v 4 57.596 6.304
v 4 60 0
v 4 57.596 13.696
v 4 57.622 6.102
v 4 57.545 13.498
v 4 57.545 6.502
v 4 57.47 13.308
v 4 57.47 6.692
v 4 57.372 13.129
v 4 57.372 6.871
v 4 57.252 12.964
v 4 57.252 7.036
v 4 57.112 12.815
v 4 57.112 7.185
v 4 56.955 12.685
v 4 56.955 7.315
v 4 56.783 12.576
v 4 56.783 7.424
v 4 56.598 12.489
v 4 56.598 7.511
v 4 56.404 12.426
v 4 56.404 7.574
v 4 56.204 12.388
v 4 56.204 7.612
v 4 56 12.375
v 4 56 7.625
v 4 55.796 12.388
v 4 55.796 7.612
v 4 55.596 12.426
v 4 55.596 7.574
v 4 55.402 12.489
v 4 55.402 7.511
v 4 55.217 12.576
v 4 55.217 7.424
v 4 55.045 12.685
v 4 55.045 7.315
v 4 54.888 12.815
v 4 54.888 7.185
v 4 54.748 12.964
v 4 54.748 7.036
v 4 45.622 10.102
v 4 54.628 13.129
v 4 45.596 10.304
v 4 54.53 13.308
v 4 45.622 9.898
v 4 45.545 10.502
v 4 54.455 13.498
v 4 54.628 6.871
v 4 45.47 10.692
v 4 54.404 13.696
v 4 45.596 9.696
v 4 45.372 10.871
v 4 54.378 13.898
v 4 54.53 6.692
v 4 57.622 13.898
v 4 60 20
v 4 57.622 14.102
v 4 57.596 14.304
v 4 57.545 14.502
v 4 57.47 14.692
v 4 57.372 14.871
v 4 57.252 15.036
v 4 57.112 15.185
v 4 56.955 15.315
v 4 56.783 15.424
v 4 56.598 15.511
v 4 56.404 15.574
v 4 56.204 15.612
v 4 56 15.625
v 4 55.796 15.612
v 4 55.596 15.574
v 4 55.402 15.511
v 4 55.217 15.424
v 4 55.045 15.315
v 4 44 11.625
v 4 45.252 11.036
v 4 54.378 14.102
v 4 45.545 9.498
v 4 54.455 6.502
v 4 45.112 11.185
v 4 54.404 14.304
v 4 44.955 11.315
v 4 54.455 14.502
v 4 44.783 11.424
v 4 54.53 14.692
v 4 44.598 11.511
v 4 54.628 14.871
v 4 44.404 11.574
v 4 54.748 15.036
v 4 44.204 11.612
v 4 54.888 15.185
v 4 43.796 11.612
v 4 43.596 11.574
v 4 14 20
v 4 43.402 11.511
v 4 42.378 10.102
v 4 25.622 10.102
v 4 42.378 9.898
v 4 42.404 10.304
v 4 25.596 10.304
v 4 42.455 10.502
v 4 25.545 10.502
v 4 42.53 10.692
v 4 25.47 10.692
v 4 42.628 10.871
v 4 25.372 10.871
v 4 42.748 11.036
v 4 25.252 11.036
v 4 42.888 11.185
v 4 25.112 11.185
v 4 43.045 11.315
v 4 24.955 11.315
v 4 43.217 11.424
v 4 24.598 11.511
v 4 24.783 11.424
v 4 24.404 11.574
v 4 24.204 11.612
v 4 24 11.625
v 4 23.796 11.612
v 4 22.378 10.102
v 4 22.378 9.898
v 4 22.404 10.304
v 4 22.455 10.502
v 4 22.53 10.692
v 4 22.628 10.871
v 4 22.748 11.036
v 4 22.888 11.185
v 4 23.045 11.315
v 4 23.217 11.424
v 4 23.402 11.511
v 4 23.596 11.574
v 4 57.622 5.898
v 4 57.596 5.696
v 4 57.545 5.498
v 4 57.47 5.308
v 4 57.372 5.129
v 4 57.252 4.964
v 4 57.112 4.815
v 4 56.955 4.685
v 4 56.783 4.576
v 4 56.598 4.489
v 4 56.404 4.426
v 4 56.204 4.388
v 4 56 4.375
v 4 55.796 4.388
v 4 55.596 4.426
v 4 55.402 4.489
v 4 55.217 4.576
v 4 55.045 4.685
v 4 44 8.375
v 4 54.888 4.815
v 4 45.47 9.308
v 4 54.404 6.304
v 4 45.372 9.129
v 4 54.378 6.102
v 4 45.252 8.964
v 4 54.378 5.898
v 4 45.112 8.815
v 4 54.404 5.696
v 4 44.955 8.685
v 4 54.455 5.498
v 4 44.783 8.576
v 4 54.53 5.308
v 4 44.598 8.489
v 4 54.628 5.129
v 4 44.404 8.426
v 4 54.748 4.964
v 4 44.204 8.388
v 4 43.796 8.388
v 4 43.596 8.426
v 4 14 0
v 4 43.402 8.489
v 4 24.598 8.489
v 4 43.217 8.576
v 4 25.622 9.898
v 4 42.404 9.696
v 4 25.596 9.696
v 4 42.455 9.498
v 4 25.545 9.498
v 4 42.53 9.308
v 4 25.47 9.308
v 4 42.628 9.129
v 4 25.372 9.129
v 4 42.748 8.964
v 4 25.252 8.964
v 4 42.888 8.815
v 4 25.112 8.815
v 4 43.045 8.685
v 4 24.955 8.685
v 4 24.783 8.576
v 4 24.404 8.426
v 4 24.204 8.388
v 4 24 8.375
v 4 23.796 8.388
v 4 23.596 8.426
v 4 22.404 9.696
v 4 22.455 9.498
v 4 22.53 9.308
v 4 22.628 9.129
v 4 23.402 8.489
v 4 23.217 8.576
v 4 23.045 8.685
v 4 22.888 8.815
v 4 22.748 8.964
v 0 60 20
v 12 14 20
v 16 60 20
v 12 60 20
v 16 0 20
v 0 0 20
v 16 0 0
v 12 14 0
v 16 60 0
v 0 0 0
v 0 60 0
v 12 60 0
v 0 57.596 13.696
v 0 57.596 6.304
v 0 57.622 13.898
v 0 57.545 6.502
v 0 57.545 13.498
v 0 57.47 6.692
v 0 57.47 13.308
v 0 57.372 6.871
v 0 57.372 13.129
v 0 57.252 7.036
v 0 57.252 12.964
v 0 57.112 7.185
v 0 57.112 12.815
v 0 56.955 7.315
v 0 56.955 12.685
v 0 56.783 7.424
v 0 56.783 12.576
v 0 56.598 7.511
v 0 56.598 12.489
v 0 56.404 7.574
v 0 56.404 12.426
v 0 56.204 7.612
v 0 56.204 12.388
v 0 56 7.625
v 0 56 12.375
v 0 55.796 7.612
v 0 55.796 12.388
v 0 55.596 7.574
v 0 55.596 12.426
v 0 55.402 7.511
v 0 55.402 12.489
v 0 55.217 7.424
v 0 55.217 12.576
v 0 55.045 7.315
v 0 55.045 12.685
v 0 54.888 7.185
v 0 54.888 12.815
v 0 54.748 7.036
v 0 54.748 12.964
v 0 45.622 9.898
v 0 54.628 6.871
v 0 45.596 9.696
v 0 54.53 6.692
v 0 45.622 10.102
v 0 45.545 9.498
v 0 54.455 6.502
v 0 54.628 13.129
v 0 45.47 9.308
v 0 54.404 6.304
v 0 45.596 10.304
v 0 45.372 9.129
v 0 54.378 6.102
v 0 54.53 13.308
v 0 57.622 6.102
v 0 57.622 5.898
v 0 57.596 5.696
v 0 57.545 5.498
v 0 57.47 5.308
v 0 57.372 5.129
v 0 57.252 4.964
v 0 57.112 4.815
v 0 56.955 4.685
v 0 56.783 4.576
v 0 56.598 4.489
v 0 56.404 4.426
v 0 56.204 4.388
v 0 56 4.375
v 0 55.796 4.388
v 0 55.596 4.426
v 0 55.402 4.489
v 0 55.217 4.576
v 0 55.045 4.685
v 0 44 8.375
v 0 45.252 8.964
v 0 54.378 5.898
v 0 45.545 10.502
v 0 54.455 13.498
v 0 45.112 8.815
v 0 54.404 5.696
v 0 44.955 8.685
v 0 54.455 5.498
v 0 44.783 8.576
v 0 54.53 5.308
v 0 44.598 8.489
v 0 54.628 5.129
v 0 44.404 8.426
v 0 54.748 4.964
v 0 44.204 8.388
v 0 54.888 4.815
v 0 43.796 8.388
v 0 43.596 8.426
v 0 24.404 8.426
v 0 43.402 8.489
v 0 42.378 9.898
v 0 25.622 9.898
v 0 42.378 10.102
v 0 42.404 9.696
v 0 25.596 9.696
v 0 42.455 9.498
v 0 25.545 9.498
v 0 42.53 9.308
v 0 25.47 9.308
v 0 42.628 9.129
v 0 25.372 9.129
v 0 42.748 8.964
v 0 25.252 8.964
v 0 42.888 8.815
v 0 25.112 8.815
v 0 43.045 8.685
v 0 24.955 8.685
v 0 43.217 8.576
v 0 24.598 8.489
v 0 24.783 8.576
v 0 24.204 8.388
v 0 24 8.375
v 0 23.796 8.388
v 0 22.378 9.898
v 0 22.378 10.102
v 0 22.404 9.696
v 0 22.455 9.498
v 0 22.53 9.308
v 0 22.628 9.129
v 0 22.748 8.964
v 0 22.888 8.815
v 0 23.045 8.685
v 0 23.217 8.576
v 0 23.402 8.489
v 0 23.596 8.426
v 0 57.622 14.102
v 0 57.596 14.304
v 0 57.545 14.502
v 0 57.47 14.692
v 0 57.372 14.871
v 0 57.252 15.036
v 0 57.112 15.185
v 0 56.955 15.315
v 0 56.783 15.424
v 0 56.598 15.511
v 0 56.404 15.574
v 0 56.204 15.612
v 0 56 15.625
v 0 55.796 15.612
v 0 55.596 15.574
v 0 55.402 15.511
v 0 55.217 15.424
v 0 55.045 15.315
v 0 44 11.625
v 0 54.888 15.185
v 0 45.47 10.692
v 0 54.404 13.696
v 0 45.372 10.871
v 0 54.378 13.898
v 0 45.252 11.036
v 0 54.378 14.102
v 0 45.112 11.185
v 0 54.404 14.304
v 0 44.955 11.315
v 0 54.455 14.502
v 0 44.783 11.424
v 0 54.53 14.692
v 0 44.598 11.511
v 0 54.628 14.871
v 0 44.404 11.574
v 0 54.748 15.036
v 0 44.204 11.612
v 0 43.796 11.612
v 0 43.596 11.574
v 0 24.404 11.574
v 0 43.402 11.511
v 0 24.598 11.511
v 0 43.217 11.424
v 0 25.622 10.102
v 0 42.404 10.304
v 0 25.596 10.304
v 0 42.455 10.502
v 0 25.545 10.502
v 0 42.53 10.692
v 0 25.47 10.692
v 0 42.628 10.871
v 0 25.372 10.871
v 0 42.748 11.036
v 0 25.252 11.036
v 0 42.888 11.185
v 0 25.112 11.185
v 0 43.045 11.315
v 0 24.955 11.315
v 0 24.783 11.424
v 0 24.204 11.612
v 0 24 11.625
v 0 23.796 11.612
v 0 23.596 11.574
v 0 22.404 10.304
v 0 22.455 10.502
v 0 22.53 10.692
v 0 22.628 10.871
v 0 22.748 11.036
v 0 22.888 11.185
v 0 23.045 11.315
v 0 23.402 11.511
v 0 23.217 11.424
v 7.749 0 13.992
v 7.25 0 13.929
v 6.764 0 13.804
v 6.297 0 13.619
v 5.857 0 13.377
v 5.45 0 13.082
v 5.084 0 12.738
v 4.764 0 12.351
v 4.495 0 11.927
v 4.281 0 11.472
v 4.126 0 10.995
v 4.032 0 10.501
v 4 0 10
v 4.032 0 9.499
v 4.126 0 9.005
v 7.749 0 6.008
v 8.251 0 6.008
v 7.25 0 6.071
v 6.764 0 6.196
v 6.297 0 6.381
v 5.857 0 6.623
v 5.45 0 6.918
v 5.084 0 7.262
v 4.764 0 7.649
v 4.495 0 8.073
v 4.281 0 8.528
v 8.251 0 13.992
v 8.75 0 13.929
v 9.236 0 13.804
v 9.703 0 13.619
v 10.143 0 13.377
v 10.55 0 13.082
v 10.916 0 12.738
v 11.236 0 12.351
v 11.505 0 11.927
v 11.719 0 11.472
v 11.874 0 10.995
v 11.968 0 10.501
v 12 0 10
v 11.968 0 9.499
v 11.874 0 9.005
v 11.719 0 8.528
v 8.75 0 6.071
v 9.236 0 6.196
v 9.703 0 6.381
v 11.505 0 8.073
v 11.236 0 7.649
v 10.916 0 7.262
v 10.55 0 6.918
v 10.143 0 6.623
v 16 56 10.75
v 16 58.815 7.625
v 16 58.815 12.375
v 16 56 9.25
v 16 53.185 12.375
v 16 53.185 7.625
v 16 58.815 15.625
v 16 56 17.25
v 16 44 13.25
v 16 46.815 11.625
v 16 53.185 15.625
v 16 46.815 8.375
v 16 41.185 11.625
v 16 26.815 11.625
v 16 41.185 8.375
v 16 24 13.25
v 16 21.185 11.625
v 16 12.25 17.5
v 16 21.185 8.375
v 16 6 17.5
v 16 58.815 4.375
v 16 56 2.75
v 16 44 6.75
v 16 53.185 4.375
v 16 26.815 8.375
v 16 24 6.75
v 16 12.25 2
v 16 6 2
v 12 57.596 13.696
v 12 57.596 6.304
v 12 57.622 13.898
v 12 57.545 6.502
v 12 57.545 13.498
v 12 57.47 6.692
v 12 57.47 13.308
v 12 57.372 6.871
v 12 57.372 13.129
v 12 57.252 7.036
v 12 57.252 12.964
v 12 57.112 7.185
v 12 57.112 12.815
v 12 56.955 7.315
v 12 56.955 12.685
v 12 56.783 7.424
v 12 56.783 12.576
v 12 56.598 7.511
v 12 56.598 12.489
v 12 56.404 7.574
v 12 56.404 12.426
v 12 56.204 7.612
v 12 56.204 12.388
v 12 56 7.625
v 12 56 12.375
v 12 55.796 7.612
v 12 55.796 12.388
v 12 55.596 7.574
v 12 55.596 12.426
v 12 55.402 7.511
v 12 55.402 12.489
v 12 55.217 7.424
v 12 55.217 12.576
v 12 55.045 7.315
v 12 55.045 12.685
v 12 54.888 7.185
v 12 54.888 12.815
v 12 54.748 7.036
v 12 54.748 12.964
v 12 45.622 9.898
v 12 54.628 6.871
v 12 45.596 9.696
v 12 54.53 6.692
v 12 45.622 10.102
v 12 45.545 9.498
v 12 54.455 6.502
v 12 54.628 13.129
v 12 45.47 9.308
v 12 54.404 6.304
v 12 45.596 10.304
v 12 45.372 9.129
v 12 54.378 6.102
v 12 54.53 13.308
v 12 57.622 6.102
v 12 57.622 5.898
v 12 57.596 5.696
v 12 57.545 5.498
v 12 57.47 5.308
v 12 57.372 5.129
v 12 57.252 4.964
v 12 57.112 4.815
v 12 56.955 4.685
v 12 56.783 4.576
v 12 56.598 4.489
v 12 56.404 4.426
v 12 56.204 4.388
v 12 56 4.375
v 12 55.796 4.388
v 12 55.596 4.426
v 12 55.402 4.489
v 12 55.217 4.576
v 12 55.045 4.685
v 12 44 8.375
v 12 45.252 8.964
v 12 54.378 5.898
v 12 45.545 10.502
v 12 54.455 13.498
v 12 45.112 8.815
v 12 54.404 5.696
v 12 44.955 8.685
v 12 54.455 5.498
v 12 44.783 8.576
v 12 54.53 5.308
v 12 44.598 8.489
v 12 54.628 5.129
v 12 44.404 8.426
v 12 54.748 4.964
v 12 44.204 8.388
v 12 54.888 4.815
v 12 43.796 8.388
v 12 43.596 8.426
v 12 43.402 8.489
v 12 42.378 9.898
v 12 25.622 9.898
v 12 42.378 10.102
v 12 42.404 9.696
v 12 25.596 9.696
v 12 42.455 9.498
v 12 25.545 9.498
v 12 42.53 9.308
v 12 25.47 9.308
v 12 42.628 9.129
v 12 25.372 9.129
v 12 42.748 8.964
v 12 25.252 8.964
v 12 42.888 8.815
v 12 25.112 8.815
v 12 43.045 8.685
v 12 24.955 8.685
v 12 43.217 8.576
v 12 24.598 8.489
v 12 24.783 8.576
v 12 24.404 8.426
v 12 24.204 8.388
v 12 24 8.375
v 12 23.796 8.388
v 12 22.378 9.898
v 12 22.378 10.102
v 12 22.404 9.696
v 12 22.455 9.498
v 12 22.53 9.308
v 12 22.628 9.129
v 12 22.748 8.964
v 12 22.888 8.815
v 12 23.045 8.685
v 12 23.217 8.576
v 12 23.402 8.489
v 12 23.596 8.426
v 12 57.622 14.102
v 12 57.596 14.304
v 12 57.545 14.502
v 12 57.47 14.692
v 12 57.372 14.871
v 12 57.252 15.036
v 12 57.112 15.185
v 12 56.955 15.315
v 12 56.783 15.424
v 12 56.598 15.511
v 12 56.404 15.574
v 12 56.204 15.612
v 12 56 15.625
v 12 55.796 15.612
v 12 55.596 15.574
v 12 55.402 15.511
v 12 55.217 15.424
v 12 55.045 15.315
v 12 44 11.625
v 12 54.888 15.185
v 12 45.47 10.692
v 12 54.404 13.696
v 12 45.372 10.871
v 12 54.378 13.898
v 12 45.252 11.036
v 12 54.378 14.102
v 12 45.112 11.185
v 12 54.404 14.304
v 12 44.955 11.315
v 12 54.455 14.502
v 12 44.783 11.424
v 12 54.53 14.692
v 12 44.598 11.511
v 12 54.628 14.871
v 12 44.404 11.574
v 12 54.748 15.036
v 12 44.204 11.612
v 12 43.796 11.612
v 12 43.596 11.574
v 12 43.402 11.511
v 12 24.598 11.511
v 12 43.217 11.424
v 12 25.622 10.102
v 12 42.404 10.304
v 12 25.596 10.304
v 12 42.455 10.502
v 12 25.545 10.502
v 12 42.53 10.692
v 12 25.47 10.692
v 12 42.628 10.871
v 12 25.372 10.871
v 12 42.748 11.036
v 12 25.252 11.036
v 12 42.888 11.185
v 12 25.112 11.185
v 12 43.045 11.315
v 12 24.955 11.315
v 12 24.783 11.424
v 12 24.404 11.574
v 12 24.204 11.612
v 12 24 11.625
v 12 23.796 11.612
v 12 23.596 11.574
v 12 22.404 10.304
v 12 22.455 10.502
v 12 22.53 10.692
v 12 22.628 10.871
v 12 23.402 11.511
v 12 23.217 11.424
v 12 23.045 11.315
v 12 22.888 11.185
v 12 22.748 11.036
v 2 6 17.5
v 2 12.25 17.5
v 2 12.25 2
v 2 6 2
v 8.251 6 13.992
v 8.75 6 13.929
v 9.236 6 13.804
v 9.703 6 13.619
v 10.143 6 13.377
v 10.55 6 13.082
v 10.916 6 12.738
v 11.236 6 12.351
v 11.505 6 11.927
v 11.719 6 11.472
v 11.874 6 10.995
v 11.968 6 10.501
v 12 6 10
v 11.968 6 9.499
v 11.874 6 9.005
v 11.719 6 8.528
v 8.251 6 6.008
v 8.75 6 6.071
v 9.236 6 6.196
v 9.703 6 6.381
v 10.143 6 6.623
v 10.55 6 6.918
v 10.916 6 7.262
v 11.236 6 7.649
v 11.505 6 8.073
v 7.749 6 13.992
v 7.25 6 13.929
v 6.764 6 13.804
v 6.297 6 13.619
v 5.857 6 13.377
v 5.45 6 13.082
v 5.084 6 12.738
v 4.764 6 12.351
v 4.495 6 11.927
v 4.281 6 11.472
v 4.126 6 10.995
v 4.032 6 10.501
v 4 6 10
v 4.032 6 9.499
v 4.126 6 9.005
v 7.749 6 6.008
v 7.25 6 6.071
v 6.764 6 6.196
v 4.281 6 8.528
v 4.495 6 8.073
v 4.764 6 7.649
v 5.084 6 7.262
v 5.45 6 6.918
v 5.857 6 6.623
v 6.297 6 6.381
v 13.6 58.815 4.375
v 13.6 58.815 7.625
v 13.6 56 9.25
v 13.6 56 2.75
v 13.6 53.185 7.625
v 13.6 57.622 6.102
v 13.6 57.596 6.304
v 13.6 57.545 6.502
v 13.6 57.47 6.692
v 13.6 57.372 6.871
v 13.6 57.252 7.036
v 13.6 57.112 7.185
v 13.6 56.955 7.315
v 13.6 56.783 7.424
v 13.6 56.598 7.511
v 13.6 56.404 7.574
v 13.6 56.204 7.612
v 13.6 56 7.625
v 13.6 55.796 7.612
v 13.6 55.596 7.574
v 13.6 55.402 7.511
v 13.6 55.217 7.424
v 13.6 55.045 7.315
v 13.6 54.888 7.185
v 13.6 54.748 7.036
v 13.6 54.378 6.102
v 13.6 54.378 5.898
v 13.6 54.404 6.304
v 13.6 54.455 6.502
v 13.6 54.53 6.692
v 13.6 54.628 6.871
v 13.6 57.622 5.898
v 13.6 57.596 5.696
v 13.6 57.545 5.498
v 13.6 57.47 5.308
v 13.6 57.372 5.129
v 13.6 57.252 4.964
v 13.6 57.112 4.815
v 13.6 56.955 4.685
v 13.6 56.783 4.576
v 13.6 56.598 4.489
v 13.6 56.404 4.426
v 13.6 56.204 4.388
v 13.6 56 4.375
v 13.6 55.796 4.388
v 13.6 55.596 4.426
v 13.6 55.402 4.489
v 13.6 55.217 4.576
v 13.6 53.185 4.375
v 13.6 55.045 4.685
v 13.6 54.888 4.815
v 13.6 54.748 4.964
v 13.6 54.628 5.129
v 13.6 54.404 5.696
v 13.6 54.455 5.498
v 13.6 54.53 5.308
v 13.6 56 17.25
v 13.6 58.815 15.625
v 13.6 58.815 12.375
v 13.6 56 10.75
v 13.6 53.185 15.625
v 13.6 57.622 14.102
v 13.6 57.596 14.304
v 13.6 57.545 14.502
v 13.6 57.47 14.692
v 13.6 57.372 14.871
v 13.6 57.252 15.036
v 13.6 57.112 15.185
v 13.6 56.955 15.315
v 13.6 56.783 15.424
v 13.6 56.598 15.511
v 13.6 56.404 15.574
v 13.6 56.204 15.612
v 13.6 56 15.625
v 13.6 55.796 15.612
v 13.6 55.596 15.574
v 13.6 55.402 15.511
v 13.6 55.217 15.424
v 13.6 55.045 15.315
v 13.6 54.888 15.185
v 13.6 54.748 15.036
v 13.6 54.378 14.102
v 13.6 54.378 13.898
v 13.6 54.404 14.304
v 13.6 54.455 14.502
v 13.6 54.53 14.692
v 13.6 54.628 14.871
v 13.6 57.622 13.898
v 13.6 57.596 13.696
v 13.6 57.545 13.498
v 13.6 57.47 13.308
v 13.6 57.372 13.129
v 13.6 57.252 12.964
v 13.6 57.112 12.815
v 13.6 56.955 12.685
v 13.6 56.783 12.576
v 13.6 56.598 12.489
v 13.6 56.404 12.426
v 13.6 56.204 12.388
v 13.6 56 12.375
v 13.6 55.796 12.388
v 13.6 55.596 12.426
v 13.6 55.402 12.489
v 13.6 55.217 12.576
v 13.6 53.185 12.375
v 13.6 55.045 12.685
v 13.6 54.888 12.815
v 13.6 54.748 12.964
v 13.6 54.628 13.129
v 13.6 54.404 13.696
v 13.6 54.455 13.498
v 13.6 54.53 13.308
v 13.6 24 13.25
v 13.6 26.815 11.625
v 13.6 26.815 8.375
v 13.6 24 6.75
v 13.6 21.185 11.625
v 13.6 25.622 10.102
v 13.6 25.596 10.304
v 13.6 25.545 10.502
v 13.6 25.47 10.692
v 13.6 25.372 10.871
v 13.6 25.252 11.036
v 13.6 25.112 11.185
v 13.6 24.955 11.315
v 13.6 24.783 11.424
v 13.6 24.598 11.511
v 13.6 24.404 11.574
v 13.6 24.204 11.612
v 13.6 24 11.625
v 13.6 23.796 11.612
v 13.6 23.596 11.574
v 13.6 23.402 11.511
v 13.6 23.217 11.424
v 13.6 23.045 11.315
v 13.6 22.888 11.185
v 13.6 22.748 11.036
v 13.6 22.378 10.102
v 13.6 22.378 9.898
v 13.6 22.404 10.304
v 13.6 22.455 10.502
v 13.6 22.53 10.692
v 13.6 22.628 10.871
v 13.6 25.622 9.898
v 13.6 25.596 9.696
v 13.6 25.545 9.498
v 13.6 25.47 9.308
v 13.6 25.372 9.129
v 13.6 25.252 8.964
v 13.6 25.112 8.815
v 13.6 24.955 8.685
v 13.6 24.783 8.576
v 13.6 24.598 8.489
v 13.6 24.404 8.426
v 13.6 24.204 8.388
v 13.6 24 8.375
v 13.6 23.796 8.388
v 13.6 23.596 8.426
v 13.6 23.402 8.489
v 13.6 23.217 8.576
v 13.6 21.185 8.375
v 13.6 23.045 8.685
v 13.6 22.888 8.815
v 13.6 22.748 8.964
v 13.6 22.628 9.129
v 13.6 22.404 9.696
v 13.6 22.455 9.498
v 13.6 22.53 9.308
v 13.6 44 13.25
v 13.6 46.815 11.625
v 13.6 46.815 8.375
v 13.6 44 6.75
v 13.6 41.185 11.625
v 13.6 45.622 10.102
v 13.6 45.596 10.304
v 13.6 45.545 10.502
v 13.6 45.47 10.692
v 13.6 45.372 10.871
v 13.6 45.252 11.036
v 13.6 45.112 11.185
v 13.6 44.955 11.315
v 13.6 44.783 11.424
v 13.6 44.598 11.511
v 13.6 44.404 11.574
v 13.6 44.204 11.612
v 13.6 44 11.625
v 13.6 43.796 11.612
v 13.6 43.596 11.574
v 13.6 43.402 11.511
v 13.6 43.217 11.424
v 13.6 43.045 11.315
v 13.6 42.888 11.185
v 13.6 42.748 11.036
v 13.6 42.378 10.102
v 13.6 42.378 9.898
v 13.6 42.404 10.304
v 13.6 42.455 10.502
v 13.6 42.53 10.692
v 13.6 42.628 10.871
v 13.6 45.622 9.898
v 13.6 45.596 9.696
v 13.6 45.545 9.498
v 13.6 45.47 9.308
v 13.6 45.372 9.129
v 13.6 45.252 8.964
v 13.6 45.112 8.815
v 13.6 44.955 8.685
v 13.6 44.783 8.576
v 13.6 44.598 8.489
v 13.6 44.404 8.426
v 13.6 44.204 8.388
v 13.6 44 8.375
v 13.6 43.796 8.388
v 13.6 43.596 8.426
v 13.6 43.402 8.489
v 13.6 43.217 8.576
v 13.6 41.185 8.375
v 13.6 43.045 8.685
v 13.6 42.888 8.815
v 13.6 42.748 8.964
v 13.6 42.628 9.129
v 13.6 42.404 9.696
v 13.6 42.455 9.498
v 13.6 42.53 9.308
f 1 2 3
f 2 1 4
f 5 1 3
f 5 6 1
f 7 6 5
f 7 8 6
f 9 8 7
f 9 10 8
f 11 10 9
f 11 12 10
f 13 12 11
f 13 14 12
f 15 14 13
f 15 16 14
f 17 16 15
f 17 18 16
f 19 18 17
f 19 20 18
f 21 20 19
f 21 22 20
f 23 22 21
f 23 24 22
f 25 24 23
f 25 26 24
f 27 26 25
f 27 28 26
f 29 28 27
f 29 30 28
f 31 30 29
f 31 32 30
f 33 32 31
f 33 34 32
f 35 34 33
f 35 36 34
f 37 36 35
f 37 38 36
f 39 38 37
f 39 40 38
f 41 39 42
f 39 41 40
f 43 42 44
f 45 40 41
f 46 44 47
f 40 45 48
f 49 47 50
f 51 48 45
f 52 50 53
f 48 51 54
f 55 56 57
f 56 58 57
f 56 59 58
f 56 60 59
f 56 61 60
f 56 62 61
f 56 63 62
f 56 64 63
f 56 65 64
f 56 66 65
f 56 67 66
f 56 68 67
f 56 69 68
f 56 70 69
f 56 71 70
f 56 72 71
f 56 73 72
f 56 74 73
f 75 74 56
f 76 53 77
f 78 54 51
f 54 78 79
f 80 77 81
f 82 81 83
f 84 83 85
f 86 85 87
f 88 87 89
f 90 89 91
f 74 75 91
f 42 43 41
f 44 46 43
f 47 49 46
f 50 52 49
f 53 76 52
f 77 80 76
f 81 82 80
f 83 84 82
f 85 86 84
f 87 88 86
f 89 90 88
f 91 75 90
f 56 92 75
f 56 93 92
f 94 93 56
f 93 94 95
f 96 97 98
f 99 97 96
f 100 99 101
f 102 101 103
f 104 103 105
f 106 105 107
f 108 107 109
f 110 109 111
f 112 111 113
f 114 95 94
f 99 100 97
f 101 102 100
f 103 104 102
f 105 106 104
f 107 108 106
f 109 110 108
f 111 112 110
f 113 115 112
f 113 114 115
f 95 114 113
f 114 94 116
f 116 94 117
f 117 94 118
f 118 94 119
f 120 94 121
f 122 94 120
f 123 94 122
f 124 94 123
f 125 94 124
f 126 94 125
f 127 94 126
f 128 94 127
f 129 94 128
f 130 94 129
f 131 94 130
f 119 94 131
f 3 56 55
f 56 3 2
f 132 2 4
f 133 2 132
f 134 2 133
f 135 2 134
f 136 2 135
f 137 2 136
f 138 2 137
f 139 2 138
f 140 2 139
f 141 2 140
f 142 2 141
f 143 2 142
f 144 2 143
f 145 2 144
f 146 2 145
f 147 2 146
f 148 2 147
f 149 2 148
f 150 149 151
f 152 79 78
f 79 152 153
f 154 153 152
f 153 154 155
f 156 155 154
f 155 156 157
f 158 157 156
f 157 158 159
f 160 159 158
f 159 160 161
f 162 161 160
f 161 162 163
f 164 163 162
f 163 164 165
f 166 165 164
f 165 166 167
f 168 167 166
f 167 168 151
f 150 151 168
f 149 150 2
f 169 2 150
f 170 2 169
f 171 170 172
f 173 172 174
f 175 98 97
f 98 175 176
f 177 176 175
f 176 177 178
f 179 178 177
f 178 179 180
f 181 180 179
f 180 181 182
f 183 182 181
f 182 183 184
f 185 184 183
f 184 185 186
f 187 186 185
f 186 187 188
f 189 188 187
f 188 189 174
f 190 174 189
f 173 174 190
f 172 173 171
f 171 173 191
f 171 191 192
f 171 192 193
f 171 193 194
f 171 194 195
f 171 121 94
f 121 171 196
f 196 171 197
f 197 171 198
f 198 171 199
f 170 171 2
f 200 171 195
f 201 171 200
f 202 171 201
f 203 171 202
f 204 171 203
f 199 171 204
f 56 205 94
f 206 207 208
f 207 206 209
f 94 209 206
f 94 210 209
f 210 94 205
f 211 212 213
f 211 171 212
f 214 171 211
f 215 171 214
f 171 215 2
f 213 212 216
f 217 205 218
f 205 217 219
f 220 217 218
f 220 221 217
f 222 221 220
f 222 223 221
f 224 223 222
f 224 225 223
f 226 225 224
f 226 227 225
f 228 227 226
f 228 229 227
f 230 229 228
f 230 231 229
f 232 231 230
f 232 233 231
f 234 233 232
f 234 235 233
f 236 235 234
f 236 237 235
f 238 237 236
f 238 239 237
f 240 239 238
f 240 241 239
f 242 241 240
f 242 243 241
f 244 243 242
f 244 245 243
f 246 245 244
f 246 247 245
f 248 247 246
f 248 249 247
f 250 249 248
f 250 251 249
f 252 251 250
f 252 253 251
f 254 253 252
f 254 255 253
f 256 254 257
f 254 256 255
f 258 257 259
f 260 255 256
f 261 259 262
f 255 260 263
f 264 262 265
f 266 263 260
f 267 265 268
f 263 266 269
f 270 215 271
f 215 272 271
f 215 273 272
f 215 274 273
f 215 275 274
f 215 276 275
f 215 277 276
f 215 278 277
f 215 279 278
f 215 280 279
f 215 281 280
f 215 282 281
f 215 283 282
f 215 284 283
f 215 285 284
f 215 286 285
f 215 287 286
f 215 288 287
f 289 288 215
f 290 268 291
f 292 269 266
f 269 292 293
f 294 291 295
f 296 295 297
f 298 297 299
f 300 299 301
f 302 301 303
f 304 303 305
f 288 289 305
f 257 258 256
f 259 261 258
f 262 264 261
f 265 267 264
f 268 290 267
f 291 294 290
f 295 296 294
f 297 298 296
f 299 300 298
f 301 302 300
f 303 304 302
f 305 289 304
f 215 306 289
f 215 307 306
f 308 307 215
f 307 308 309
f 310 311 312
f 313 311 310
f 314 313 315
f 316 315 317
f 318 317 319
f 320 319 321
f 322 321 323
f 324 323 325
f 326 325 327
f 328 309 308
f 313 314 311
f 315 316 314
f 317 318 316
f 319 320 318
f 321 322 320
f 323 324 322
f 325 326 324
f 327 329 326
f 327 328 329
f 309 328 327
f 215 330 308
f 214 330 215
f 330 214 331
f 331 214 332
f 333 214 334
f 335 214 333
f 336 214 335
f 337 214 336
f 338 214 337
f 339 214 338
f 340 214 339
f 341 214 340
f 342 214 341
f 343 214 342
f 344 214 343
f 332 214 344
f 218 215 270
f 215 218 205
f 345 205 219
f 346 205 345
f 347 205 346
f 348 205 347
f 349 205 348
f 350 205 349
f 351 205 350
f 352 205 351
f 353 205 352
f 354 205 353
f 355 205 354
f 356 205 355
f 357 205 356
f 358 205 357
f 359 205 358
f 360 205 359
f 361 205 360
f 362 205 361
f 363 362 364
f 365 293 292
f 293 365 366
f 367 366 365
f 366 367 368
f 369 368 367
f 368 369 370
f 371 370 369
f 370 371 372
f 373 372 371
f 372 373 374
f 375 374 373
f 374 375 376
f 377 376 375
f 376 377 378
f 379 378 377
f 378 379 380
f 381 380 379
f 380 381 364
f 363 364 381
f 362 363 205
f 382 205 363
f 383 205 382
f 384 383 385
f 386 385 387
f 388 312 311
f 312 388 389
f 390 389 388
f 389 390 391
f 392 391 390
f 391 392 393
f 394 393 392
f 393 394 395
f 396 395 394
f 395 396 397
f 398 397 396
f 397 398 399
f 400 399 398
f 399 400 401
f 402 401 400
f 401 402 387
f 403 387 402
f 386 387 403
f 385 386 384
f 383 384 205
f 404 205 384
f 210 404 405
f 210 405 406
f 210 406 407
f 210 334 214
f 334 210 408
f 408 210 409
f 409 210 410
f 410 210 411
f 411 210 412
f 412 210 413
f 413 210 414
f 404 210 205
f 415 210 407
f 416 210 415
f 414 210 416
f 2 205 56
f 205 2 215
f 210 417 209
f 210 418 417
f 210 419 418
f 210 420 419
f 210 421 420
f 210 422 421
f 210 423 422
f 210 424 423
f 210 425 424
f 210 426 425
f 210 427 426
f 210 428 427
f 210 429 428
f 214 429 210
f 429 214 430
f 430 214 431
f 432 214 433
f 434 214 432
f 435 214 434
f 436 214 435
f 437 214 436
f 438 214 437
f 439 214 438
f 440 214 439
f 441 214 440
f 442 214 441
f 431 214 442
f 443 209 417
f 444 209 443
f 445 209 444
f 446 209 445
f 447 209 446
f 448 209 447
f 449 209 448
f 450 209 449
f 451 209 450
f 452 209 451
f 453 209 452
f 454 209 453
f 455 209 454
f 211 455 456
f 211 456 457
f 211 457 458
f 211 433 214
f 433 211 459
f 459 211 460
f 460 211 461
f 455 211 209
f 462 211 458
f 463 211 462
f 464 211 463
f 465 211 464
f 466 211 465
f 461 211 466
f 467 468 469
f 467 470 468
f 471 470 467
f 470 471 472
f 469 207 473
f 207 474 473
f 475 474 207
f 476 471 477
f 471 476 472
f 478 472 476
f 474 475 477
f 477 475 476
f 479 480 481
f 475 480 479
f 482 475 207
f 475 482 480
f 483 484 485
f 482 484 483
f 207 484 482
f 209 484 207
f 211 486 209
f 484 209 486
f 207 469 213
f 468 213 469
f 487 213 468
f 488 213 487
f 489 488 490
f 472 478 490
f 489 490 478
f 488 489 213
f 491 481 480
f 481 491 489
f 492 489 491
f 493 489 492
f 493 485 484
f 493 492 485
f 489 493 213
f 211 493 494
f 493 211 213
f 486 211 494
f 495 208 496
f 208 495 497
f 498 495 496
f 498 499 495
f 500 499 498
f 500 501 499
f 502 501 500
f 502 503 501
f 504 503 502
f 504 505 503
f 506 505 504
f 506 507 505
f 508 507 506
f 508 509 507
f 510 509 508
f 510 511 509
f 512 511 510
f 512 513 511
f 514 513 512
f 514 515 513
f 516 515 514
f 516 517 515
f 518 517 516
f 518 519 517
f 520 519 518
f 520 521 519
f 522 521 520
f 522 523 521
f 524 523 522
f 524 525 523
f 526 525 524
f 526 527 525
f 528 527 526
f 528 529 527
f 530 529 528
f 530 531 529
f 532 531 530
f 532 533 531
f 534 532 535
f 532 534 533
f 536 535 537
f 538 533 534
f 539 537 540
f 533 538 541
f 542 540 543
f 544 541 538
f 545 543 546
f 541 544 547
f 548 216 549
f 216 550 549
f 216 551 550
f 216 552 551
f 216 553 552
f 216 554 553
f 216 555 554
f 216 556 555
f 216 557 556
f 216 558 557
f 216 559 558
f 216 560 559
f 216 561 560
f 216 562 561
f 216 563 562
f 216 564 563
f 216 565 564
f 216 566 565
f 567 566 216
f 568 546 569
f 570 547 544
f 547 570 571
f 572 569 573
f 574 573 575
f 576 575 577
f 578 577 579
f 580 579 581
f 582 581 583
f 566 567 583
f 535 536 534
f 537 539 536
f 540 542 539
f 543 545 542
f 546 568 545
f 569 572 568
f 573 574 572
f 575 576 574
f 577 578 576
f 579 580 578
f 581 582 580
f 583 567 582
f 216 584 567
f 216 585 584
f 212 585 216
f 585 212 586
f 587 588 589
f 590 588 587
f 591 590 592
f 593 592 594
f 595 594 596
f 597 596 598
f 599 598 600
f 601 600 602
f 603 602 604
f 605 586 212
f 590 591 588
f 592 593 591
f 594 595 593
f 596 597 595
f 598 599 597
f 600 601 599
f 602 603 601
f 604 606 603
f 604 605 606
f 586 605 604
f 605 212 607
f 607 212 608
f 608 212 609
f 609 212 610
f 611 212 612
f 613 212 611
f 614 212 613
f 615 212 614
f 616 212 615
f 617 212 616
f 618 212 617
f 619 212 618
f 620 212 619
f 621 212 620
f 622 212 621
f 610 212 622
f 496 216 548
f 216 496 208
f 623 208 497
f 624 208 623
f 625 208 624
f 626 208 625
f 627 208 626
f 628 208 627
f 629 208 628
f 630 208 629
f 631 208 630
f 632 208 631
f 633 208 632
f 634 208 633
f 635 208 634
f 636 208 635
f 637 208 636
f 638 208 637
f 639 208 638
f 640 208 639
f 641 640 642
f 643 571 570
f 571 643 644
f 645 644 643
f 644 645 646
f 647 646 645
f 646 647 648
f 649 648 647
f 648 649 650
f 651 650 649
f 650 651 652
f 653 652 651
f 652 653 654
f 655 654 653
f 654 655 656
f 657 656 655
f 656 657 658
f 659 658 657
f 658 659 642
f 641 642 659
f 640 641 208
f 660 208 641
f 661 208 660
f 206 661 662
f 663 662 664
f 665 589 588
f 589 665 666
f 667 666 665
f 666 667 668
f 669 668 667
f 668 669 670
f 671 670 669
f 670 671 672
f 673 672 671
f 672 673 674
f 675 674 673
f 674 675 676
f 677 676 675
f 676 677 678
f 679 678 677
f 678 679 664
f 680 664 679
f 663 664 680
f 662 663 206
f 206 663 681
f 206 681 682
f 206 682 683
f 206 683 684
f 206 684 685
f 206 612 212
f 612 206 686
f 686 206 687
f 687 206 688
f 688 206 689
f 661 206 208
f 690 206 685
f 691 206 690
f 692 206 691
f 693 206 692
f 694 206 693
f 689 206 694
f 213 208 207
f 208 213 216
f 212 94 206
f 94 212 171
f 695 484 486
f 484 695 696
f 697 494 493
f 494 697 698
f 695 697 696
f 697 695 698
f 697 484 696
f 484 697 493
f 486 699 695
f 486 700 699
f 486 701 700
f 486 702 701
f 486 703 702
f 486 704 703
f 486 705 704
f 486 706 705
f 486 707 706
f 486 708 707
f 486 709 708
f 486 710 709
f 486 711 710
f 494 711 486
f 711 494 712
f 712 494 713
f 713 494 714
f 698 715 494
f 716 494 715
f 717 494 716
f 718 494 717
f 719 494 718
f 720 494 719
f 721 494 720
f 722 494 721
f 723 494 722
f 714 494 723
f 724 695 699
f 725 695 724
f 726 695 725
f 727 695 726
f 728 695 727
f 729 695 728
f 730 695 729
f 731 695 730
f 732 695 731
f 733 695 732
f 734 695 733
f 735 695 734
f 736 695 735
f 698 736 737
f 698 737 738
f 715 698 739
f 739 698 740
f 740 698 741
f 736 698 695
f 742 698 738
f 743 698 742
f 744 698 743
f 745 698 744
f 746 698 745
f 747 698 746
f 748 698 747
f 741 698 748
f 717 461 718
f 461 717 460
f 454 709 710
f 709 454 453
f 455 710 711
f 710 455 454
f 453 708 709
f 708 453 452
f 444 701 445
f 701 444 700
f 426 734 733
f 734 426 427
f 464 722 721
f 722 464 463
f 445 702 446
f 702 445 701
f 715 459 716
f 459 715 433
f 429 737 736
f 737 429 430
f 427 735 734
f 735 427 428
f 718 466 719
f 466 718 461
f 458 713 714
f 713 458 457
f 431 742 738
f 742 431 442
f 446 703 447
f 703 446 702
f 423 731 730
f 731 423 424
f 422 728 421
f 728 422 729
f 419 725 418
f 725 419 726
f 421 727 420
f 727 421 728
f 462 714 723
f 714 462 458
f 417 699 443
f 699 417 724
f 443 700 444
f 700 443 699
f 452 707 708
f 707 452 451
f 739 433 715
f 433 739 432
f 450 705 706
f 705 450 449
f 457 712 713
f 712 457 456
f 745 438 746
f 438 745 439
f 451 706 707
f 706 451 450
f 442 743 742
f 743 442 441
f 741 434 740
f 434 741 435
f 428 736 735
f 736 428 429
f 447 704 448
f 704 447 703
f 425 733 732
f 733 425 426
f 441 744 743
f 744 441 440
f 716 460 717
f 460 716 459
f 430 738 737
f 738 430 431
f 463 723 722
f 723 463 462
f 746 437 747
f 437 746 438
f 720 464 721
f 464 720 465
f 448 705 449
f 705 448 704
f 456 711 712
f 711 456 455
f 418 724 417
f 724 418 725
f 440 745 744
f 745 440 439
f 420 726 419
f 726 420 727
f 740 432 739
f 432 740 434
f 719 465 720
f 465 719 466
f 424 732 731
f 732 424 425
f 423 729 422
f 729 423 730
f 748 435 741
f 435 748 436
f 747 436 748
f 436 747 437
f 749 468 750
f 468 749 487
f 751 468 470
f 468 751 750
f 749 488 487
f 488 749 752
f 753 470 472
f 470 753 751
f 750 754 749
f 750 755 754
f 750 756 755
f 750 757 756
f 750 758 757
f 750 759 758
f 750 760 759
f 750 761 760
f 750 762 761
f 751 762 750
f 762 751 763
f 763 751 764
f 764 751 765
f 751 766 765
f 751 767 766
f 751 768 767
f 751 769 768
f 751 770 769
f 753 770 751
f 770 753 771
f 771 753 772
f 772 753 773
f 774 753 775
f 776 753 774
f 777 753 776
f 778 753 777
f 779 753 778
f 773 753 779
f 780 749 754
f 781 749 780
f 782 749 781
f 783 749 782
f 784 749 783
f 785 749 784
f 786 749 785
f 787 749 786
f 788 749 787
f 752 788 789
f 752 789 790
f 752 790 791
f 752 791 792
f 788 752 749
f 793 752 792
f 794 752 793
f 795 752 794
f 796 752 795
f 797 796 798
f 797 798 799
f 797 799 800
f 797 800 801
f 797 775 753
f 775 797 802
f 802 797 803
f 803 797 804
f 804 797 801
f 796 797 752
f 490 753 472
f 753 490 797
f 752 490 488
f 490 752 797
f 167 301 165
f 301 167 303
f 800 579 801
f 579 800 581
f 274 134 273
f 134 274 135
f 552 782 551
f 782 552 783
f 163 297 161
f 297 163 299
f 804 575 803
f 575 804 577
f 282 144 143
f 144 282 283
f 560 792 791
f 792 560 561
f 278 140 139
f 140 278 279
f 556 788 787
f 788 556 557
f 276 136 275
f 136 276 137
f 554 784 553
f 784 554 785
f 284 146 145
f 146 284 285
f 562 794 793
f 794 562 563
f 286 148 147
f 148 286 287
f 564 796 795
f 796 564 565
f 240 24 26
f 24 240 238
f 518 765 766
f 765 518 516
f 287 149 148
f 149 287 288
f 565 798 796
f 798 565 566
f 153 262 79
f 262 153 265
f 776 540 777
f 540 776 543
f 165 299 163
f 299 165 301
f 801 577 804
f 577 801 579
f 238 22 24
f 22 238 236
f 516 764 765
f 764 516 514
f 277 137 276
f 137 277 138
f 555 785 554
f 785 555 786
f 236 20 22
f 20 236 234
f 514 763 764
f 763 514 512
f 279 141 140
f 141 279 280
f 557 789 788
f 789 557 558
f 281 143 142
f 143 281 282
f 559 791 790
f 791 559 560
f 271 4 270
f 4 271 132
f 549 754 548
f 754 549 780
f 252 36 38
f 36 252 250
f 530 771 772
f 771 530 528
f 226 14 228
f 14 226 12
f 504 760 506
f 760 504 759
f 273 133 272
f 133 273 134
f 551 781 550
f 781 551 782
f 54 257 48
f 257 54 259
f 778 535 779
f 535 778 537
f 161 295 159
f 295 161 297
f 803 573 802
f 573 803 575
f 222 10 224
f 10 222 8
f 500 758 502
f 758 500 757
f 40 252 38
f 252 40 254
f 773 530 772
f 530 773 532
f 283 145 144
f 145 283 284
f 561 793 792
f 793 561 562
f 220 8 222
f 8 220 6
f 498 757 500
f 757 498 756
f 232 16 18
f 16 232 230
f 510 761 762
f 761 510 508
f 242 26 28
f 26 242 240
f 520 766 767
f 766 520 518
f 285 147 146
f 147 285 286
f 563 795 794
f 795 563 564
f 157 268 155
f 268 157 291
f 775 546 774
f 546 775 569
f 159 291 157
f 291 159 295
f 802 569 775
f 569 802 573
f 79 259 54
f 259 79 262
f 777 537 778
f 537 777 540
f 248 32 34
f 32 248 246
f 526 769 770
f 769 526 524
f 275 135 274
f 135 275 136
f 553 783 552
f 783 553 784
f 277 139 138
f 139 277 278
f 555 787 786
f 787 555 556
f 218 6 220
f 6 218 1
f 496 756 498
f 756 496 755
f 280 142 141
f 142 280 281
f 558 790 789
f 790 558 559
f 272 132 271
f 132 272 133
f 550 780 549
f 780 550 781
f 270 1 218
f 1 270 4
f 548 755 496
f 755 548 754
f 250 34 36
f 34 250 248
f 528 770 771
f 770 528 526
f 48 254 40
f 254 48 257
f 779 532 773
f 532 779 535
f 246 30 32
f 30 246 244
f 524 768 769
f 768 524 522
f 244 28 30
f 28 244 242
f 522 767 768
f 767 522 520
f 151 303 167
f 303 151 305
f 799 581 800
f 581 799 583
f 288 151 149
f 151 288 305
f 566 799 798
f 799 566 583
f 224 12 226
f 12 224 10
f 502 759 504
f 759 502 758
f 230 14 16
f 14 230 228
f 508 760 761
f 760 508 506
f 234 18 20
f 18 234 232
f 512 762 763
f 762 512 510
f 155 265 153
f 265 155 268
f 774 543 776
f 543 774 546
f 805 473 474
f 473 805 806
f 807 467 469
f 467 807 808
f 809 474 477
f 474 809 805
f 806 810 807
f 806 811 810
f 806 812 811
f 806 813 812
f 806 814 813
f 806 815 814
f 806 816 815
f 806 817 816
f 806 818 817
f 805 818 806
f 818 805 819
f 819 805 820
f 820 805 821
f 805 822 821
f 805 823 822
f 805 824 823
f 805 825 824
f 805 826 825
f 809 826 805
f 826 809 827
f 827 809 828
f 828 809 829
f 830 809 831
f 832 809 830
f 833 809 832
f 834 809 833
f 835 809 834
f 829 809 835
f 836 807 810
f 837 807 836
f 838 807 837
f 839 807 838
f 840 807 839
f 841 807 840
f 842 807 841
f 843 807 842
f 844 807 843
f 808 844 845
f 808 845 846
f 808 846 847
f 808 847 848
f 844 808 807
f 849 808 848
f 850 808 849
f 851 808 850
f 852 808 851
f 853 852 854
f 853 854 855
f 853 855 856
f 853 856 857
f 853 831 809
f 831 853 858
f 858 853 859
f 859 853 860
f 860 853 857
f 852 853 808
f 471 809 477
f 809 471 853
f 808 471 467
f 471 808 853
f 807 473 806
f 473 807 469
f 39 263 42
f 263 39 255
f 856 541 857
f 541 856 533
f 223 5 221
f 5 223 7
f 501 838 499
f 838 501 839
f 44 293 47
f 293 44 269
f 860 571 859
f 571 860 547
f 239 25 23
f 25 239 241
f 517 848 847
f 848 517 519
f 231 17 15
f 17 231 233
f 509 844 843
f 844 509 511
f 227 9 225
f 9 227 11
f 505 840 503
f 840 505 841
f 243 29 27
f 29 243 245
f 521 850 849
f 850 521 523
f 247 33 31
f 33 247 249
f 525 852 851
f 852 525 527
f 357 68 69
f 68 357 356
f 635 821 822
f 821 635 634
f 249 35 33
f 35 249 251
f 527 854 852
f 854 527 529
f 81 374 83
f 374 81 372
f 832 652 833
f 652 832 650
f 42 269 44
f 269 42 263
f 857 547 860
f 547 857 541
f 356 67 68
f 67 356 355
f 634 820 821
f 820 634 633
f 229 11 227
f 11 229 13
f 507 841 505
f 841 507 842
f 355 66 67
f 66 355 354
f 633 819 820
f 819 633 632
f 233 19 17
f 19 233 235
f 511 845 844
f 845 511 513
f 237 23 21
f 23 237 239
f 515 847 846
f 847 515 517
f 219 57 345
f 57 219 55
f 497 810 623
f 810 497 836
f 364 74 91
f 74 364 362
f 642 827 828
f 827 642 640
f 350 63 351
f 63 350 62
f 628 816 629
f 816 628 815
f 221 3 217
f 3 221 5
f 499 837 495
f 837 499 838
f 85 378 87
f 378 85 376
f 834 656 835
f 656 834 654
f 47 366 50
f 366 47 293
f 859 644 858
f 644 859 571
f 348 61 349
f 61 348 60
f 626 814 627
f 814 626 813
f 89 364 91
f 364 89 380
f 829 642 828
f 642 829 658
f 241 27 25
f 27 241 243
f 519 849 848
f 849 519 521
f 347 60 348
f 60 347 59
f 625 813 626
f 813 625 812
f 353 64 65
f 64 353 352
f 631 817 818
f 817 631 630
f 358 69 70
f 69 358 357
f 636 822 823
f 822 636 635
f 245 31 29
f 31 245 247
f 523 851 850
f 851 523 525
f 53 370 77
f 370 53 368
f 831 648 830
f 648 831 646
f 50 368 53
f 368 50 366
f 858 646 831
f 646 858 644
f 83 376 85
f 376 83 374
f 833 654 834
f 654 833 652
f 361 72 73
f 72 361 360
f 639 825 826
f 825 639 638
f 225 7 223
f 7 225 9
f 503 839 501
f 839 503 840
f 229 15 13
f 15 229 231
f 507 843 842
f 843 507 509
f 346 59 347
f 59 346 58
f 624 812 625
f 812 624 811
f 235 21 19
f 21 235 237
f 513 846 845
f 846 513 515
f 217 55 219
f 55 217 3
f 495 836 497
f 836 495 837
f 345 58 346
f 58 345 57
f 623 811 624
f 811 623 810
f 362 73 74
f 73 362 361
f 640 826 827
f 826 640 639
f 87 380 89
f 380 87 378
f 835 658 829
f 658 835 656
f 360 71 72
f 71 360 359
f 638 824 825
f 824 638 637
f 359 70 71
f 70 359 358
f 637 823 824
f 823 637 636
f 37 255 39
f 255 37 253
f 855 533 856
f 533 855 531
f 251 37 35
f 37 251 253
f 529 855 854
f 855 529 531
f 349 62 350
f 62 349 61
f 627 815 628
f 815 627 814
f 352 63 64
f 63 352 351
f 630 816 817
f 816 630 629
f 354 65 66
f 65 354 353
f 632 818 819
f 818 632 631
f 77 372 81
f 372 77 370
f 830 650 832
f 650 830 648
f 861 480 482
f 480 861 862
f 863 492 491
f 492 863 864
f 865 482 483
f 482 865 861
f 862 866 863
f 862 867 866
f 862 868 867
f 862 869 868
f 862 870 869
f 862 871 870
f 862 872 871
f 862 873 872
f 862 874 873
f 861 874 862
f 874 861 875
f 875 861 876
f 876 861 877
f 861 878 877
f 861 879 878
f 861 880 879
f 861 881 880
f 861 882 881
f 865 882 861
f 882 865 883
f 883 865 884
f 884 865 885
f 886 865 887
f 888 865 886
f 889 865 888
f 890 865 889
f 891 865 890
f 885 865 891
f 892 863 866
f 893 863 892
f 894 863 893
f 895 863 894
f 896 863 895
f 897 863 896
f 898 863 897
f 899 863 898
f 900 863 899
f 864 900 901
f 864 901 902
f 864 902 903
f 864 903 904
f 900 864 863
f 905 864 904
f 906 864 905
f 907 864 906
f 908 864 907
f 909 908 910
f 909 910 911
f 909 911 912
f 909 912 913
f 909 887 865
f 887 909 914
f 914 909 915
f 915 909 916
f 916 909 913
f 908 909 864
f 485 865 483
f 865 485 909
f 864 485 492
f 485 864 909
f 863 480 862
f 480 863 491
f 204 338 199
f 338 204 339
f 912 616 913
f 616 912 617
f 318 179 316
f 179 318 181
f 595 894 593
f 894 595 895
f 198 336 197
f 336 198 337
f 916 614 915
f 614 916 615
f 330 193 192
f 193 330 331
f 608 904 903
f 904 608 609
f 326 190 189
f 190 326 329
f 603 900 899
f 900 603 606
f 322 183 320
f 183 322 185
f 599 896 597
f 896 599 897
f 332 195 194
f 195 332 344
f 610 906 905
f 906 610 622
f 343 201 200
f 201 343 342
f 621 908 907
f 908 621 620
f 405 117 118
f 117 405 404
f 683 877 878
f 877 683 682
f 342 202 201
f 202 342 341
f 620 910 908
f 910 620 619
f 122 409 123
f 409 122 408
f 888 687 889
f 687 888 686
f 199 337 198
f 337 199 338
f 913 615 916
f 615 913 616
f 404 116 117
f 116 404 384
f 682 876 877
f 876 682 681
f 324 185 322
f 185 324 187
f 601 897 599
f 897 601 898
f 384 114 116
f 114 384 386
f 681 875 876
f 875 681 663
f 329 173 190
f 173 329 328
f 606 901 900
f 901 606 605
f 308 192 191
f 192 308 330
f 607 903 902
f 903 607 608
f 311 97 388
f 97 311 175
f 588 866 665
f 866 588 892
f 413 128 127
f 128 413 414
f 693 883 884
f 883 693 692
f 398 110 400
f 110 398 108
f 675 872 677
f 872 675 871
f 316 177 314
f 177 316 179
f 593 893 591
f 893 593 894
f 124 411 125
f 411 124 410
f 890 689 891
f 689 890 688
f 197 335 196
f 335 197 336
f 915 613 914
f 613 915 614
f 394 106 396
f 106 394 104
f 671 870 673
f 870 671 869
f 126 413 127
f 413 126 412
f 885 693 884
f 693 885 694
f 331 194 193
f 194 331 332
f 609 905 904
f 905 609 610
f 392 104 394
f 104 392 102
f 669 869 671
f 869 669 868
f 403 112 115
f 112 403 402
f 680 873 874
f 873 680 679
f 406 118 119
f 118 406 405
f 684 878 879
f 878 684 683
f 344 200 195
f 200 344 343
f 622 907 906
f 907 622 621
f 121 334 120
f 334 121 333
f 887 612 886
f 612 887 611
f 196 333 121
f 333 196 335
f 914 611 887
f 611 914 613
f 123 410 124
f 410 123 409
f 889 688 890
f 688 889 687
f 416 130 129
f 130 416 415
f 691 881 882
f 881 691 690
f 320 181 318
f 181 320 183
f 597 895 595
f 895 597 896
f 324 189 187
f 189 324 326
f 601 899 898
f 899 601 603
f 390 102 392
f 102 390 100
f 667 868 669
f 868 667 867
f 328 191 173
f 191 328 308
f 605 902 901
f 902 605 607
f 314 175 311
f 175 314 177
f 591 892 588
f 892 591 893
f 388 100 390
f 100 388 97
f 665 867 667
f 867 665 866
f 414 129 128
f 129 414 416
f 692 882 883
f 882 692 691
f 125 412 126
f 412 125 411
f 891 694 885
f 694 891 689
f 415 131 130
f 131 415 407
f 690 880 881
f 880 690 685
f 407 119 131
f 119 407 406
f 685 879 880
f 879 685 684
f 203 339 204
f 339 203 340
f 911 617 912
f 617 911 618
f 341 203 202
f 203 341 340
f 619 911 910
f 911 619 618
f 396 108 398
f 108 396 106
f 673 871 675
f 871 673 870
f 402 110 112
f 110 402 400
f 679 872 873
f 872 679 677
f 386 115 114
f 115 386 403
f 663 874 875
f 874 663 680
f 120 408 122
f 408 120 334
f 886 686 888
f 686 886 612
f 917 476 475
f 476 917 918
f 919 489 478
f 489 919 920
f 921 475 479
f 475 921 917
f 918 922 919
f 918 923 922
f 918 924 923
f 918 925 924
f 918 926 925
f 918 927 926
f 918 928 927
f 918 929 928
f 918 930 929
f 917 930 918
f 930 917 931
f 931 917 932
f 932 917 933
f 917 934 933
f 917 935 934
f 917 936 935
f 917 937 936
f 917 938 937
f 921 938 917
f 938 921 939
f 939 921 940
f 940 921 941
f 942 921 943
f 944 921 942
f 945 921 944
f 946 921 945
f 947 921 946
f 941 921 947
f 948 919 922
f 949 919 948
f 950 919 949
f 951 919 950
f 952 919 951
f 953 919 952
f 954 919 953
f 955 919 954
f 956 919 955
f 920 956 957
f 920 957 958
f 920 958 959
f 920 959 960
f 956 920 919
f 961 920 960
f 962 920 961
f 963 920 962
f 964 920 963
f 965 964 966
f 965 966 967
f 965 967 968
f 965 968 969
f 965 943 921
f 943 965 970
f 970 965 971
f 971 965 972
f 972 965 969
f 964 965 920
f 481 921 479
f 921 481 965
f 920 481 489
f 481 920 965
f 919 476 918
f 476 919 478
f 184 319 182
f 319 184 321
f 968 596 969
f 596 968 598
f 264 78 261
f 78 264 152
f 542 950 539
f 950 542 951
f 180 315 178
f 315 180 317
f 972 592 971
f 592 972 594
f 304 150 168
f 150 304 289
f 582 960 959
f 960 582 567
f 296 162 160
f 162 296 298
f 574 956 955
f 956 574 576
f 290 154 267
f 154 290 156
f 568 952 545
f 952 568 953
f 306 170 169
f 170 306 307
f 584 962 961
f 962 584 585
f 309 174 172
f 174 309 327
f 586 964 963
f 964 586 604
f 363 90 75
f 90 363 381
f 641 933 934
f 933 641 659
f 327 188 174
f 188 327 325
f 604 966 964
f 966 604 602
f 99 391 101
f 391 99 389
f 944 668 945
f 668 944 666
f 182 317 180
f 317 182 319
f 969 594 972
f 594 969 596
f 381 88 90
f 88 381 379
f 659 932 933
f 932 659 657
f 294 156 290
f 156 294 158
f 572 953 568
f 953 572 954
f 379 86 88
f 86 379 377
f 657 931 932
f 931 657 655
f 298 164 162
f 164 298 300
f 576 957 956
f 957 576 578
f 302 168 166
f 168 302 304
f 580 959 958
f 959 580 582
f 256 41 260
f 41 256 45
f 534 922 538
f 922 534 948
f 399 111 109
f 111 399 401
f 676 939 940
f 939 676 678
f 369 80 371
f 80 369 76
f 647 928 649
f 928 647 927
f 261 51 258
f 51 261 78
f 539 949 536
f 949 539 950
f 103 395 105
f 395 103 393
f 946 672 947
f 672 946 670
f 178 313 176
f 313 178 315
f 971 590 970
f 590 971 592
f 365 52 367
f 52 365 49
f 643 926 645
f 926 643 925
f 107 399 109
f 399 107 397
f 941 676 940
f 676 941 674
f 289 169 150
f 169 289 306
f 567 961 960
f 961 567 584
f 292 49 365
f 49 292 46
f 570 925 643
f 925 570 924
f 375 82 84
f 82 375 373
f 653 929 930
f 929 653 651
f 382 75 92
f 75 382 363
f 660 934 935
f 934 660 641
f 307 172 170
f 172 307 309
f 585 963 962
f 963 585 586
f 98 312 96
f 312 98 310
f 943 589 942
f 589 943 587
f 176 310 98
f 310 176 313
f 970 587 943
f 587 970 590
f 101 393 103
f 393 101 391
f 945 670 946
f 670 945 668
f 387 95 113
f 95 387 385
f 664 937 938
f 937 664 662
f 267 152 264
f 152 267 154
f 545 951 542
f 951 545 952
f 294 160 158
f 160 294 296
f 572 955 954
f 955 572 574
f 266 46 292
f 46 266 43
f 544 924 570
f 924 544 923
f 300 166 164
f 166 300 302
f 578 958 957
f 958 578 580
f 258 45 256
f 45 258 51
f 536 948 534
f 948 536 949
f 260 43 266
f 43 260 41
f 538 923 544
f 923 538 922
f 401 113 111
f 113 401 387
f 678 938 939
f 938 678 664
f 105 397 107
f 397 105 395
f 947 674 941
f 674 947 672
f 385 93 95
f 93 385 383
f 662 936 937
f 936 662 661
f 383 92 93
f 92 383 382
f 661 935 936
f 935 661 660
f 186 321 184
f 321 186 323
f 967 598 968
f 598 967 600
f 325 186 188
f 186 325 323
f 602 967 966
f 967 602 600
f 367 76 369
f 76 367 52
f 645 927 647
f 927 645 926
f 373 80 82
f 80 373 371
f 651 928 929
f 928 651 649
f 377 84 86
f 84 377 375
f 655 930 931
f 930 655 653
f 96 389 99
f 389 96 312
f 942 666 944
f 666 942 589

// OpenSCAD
//---------------------------------------------------------------------
//  Spool holder for Prusa i3 with 6mm aluminium Frame   
//  (c)iPadNanito <@iPadNanito> , March-2013    
//  (c)Ying-Chun Liu (PaulLiu) <paulliu@debian.org>, January-2016
//---------------------------------------------------------------------

nut_diam = 6.5;  // M3 Nut diameter
screw_diam = nut_diam/2; // Nut hole for screw diameter
frame_thickness = 8; // aluminium frame thickness

module nut(nut_diam)
{	
	rotate([0,90,0])
	cylinder(r=nut_diam/2, h=3, $fn=6, center = true); //M3 nut body without screw hole
}

module frame(gap) {
    union() {
        cube([4,60,20]);
        translate([gap+4,0,0]) {
            cube([4,60,20]);
        }
        cube([4+gap+4,14,20]);
    }
}


difference() {
    frame(frame_thickness);

    translate([1+(frame_thickness-6)/2,6,2]) {
        cube([4+frame_thickness+4,6.25,15.5]); // Hole where inserts M8 nut 
    }

    translate([(4+frame_thickness+4)/2,7,10]) {
        rotate([90,0,0]) {
            cylinder(r=8/2, h=20, $fn=50); // M8 hole for threaded rod
        }
    }
    
    translate([1.5+4+frame_thickness+4-2.4,56,6]) {
        nut(nut_diam); // M3 nut 1
    }
    translate([-1,56,6]) {
        rotate([0,90,0]) {
            cylinder(r=screw_diam/2,h=frame_thickness+4+4+2, $fn=50); // Nut hole for screw 1
        }
    }
    
    translate([1.5+4+frame_thickness+4-2.4,56,14]) {
        nut(nut_diam); // M3 nut 2
    }
    translate([-1,56,14]) {
        rotate([0,90,0]) {
            cylinder(r=screw_diam/2,h=frame_thickness+4+4+2, $fn=50); // Nut hole for screw 2
        }
    }
    
    translate([1.5+4+frame_thickness+4-2.4,14+10,10]) {
        nut(nut_diam); // M3 nut 3
    }
    translate([-1,14+10,10]) {
        rotate([0,90,0]) {
            cylinder(r=screw_diam/2,h=frame_thickness+4+4+2, $fn=50); // Nut hole for screw 3
        }
    }

    translate([1.5+4+frame_thickness+4-2.4,14+30,10]) {
        nut(nut_diam); // M3 nut 4
    }
    translate([-1,14+30,10]) {
        rotate([0,90,0]) {
            cylinder(r=screw_diam/2,h=frame_thickness+4+4+2, $fn=50); // Nut hole for screw 4
        }
    }
}
